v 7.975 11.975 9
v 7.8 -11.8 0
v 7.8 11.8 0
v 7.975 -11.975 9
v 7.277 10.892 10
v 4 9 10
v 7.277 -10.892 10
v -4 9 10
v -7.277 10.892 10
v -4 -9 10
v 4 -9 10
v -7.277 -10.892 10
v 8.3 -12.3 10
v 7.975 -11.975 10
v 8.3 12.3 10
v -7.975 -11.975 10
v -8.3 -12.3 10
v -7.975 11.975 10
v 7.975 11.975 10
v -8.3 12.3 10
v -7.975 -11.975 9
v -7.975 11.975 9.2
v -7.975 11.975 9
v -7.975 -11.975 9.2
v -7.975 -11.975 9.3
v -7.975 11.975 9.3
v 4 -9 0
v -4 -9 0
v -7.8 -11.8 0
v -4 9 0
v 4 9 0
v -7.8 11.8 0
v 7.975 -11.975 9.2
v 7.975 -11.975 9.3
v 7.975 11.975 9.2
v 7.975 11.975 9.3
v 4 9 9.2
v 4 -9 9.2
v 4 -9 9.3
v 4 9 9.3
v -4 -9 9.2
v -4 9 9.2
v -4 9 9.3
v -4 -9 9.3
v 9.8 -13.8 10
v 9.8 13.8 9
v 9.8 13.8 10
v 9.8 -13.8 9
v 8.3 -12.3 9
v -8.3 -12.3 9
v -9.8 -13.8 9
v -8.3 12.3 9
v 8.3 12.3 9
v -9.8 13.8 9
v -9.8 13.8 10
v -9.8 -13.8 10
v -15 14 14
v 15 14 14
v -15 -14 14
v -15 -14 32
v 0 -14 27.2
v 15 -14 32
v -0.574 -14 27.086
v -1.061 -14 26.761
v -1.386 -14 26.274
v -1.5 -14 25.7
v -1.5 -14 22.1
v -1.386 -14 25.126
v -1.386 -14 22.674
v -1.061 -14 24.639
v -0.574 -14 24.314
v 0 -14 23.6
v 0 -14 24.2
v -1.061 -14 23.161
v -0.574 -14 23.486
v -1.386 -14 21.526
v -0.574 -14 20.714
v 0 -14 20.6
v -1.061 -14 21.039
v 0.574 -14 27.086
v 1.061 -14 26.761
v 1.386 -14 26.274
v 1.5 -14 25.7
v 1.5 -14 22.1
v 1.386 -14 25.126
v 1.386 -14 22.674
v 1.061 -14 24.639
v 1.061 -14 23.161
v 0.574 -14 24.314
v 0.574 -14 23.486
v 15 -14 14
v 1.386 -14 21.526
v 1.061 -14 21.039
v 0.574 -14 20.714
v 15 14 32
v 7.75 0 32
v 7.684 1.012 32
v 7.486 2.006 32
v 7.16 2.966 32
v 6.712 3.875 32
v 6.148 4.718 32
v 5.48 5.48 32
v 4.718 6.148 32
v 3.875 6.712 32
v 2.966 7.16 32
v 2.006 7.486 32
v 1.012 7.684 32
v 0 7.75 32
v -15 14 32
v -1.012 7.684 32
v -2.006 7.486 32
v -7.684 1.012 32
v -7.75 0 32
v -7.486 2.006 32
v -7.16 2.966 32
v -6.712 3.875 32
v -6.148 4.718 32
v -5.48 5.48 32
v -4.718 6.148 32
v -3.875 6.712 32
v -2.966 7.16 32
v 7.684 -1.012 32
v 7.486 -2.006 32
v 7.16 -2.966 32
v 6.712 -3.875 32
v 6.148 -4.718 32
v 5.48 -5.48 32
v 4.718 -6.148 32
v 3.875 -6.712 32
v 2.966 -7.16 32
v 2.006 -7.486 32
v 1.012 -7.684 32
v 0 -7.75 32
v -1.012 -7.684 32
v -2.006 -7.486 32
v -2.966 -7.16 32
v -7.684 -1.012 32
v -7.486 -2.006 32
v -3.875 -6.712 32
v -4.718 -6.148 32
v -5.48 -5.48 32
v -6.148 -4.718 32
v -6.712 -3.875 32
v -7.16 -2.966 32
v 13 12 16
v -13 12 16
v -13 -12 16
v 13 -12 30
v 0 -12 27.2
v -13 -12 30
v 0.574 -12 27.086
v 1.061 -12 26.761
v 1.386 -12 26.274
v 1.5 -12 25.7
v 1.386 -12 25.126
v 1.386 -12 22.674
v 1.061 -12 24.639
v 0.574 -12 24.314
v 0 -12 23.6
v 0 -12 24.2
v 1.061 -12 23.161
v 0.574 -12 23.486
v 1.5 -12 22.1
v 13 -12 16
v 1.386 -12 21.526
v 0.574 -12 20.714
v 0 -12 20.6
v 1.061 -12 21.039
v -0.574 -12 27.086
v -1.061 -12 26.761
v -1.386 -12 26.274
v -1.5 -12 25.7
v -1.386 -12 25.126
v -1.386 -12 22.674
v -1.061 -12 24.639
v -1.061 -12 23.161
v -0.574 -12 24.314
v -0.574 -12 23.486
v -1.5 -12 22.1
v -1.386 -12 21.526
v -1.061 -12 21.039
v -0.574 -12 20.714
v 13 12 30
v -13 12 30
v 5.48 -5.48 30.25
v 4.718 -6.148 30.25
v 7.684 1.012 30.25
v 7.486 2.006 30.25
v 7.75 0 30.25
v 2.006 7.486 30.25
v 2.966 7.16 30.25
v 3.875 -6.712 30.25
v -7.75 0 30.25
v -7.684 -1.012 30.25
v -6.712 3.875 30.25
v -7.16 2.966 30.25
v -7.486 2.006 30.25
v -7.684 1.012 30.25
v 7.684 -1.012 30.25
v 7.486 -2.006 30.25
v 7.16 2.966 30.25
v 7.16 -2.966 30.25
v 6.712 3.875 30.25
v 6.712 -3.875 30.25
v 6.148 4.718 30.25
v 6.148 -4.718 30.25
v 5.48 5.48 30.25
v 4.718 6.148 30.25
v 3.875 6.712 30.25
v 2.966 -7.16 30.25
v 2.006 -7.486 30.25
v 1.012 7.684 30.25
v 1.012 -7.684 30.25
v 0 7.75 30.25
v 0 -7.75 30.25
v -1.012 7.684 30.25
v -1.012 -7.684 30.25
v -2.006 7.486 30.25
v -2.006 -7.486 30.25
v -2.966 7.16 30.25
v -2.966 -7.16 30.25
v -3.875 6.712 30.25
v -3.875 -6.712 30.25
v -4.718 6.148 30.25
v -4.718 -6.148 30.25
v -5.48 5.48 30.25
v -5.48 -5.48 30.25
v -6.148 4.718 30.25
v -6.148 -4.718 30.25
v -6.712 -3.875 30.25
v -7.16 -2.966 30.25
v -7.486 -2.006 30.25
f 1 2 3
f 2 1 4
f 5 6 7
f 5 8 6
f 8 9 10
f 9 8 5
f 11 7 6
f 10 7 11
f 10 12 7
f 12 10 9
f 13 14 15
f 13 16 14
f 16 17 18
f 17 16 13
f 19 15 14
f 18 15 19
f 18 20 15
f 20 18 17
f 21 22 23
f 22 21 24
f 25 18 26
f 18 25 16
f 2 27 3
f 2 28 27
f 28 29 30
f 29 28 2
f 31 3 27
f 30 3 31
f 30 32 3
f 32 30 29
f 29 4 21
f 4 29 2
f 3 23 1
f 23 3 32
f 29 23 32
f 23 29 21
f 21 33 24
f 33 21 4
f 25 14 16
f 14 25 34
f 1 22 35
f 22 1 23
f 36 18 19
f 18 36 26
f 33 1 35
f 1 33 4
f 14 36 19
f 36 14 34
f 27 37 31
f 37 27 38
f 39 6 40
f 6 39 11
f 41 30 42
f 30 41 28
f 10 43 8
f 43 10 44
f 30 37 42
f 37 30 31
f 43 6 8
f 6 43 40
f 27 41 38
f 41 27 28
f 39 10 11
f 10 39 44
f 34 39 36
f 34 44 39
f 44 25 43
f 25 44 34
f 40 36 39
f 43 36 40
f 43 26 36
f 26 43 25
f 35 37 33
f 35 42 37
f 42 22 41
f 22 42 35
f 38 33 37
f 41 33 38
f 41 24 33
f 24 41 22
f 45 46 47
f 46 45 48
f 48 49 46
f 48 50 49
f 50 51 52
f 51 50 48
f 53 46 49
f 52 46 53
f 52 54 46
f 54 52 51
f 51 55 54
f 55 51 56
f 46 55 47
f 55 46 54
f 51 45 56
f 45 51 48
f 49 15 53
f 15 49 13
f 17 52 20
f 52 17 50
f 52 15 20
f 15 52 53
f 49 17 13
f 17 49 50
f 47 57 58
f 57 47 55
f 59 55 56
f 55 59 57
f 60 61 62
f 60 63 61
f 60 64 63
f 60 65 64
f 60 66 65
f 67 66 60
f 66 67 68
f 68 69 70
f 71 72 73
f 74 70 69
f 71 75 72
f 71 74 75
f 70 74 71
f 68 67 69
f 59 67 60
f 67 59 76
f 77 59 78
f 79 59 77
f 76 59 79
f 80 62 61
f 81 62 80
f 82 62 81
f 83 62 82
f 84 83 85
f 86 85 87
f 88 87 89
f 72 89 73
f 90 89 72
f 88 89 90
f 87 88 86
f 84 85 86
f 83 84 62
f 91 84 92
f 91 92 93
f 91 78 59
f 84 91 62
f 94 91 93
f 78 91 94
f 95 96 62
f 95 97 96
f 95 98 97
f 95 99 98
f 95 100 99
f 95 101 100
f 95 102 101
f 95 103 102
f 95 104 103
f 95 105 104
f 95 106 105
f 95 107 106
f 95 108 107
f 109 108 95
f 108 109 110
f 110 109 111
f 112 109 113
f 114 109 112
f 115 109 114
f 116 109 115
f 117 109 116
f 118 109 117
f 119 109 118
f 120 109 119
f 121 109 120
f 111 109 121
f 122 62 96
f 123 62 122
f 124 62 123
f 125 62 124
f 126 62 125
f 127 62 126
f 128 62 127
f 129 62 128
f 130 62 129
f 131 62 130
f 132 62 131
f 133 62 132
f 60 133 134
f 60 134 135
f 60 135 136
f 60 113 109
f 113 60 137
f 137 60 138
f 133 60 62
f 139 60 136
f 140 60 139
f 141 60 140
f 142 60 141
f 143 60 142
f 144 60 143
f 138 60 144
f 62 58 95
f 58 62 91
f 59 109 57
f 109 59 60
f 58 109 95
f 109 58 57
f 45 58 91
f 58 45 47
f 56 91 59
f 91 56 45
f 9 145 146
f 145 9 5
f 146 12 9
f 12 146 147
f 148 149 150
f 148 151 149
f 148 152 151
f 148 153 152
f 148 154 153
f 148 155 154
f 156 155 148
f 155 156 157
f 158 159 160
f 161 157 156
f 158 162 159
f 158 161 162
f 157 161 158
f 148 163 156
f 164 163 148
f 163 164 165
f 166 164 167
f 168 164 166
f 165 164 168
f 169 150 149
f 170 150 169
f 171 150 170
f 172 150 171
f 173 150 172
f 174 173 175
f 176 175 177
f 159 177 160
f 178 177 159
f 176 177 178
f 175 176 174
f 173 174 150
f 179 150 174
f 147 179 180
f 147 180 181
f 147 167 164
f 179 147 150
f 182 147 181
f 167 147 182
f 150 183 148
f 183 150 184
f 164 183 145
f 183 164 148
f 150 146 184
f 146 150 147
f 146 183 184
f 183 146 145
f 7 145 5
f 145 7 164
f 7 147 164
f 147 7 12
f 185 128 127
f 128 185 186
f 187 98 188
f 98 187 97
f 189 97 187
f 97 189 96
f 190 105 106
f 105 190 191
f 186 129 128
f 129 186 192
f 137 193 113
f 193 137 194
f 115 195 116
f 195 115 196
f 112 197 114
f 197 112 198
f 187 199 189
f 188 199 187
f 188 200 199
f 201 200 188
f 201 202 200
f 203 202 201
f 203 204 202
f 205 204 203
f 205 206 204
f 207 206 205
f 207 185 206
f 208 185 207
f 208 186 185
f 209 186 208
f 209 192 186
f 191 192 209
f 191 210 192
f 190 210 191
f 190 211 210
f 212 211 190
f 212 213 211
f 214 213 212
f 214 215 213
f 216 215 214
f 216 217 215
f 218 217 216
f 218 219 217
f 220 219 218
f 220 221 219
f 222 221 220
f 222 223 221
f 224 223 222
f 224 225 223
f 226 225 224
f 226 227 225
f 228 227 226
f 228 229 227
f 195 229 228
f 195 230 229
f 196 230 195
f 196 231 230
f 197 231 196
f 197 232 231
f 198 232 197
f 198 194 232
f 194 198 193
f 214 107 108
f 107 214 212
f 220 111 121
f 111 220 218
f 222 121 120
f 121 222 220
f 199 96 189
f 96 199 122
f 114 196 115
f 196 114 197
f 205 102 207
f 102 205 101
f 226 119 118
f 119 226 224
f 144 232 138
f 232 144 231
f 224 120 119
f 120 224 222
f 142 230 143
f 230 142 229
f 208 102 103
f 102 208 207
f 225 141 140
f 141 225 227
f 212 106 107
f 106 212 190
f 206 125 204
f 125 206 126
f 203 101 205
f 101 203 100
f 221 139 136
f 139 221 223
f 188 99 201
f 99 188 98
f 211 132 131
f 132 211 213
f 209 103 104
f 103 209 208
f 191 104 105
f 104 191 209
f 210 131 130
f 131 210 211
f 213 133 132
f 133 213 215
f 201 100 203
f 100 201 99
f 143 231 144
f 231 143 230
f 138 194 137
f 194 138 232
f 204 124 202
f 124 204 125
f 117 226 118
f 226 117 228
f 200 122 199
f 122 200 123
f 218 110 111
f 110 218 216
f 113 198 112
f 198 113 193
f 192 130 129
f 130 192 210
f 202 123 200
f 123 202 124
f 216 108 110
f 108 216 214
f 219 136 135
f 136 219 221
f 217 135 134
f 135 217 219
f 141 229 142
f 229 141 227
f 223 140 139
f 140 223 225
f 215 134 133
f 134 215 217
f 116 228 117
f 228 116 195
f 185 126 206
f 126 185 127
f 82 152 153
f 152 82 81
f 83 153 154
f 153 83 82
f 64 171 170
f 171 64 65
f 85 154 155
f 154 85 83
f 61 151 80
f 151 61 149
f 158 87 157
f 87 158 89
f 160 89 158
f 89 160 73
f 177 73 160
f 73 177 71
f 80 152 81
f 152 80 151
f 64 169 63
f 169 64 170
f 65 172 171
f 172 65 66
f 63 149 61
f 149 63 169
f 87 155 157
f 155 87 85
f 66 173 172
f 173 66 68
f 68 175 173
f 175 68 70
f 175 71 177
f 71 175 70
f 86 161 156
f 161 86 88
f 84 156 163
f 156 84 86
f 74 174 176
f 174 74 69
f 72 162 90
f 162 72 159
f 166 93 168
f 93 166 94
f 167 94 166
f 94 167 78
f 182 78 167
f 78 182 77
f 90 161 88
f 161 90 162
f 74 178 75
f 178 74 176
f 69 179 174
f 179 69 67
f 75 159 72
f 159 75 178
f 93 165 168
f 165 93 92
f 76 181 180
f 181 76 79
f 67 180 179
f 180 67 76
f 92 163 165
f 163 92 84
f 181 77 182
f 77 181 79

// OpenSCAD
// file: sleds.scad
// ==========================================
// Xentient Framework - Universal Sled & Socket Library
// Shared modules for all peripheral caps
// ==========================================
// Per Framework §2: Universal Mating Protocol
// Female Socket (in hub): 24.0×16.0×10.0mm, wire channel 18×8mm
// Male Sled (on cap base): 23.6×15.6×10.0mm, 1° draft, hollow 18×8mm
// Units: mm

$fn = 64;

// ==========================================
// MALE SLED PARAMETERS
// ==========================================

Sled_W       = 23.6;    // Width (0.4mm tolerance in female 24.0mm)
Sled_H       = 15.6;    // Height (0.4mm tolerance in female 16.0mm)
Sled_D       = 10.0;    // Depth (insertion length)
Sled_Draft   = 1.0;     // 1-degree draft angle
Sled_Wire_W  = 18.0;    // Wire pass-through width
Sled_Wire_H  = 8.0;     // Wire pass-through height
Sled_Wall    = 2.0;     // Minimum wall thickness

// Derived
Sled_Draft_Off = Sled_D * tan(Sled_Draft);  // ~0.17mm per side

// ==========================================
// MODULE: male_sled()
// The plug base that inserts into the hub's female socket.
// All caps start with this at their base.
//
// Usage: difference() { male_sled(); /* your cap-specific cutouts */ }
// ==========================================

module male_sled() {
    difference() {
        // Outer body with 1° draft
        hull() {
            // Entry face (slightly larger for wedge fit)
            translate([0, 0, Sled_D - 0.5])
                cube([Sled_H + 2*Sled_Draft_Off,
                      Sled_W + 2*Sled_Draft_Off,
                      1], center=true);
            // Inner face (exact size)
            translate([0, 0, 0.5])
                cube([Sled_H, Sled_W, 1], center=true);
        }

        // Wire pass-through (hollow core)
        translate([0, 0, Sled_D / 2])
            cube([Sled_Wire_H, Sled_Wire_W, Sled_D + 2], center=true);

        // Entry chamfer (45° for easy insertion)
        chamfer_h = 1.5;
        translate([0, 0, Sled_D - chamfer_h/2])
            hull() {
                cube([Sled_H + 2*chamfer_h, Sled_W + 2*chamfer_h, 0.1], center=true);
                cube([Sled_H, Sled_W, 0.1], center=true);
            }
    }
}

// ==========================================
// MODULE: male_sled_with_flange()
// Adds a flange around the sled base for cap-to-hub transition.
// Flange sits flush against hub exterior face.
//
// flange_w: extra width beyond sled on each side
// flange_h: extra height beyond sled on each side
// flange_t: flange thickness
// ==========================================

module male_sled_with_flange(flange_w=2.0, flange_h=2.0, flange_t=2.0) {
    union() {
        male_sled();

        // Flange ring around sled entry
        translate([0, 0, Sled_D])
            difference() {
                cube([Sled_H + 2*flange_h,
                      Sled_W + 2*flange_w,
                      flange_t], center=true);
                // Cut sled opening through flange
                cube([Sled_H + 1, Sled_W + 1, flange_t + 2], center=true);
            }
    }
}

// ==========================================
// MODULE: wire_channel()
// Internal wire routing channel from sled to component.
// Extends from sled core outward through the cap body.
//
// length: distance from sled to component
// direction: "straight" or "angled"
// ==========================================

module wire_channel(length=15, direction="straight") {
    if (direction == "straight") {
        translate([0, 0, Sled_D / 2 + length / 2])
            cube([Sled_Wire_H, Sled_Wire_W, length + 1], center=true);
    }
}

// ==========================================
// VISUALIZATION HELPERS
// ==========================================

// Render just the sled for testing
// male_sled();
// main file
// ==========================================
// Xentient Framework - Housing 4: Motion (HC-SR501 PIR)
// Recessed shroud with Fresnel lens cutout and adjustment holes
// ==========================================
// Component: HC-SR501 PIR (23×23mm board, 15mm dome)
// Connection: 4-pin JST XH pigtail (VCC, GND, OUT, NC)
//              3 active pins, 4th unused (3-pin JST not in BOM)
// Socket: 210° face (human detection height)
// Per Framework §4 Housing 4
// Units: mm

include <sleds.scad>;

$fn = 64;

// ==========================================
// COMPONENT DIMENSIONS
// ==========================================

PIR_Board_W  = 23.0;   // HC-SR501 board width
PIR_Board_H  = 23.0;   // HC-SR501 board height (roughly square)
PIR_Board_T  = 1.6;    // PCB thickness
PIR_Dome_Dia = 15.0;   // Fresnel lens dome diameter
PIR_Dome_H   = 12.0;   // Dome height above board
PIR_Clear    = 0.4;    // Clearance per side

// Potentiometer access holes
Pot_Dia      = 3.0;    // Access hole diameter for screwdriver
Pot_Offset_X = 5.5;    // Distance from board center to pot center
Pot_Offset_Y = 7.0;    // Forward offset

// Housing dimensions
Shroud_W     = 28.0;   // Width of shroud (23mm board + walls)
Shroud_H     = 30.0;   // Height of shroud
Shroud_D     = 18.0;   // Depth of shroud (dome clearance)
House_Wall   = 2.0;    // Wall thickness
Lens_Cutout  = 15.5;   // 15mm dome + 0.5mm clearance
House_Wall2  = 1.5;    // Thin wall near lens dome

// ==========================================
// MODULE: housing_motion()
// ==========================================

module housing_motion() {
    union() {
        // Sled base with flange
        male_sled_with_flange(flange_w=2.0, flange_h=2.0, flange_t=2.0);

        // Recessed shroud body
        translate([0, 0, Sled_D]) {
            difference() {
                // Outer shroud
                hull() {
                    // Transition from sled
                    translate([0, 0, 1])
                        cube([Sled_H + 4, Sled_W + 4, 2], center=true);
                    // Shroud body
                    translate([0, 0, Shroud_D / 2 + 4])
                        cube([Shroud_H, Shroud_W, Shroud_D], center=true);
                }

                // Inner cavity
                hull() {
                    translate([0, 0, 0.5])
                        cube([Sled_H - 2, Sled_W - 2, 2], center=true);
                    translate([0, 0, Shroud_D / 2 + 4])
                        cube([Shroud_H - 2*House_Wall, Shroud_W - 2*House_Wall,
                              Shroud_D - 2*House_Wall], center=true);
                }

                // Fresnel lens dome cutout (front face)
                // 15.5mm circular hole allowing dome to protrude
                translate([0, 0, Shroud_D + 4])
                    cylinder(h=House_Wall2 + 2, d=Lens_Cutout, center=true, $fn=48);

                // Recessed shelf for PIR board (sits inside shroud)
                translate([0, 0, Shroud_D * 0.4 + 4])
                    difference() {
                        cube([PIR_Board_W + PIR_Clear, PIR_Board_H + PIR_Clear, 3], center=true);
                        // Center cutout (board sits on shelf edges)
                        translate([0, 0, 1.5])
                            cube([PIR_Board_W - 2, PIR_Board_H - 2, 3], center=true);
                    }

                // Wire channel
                translate([0, 0, -2])
                    cube([Sled_Wire_H, Sled_Wire_W, Shroud_D + 8], center=true);

                // ===== POTENTIOMETER ACCESS HOLES =====
                // Two 3mm holes on side wall for Sensitivity and Delay adjustment
                // Left side: Sensitivity pot
                translate([0, -Shroud_W/2 - 1, Shroud_D * 0.65 + 4])
                    rotate([90, 0, 0])
                        cylinder(h=House_Wall + 4, d=Pot_Dia, center=true, $fn=16);
                // Left side: Delay pot (offset from first)
                translate([0, -Shroud_W/2 - 1, Shroud_D * 0.45 + 4])
                    rotate([90, 0, 0])
                        cylinder(h=House_Wall + 4, d=Pot_Dia, center=true, $fn=16);
            }
        }
    }
}

// ==========================================
// RENDER
// ==========================================

housing_motion();
